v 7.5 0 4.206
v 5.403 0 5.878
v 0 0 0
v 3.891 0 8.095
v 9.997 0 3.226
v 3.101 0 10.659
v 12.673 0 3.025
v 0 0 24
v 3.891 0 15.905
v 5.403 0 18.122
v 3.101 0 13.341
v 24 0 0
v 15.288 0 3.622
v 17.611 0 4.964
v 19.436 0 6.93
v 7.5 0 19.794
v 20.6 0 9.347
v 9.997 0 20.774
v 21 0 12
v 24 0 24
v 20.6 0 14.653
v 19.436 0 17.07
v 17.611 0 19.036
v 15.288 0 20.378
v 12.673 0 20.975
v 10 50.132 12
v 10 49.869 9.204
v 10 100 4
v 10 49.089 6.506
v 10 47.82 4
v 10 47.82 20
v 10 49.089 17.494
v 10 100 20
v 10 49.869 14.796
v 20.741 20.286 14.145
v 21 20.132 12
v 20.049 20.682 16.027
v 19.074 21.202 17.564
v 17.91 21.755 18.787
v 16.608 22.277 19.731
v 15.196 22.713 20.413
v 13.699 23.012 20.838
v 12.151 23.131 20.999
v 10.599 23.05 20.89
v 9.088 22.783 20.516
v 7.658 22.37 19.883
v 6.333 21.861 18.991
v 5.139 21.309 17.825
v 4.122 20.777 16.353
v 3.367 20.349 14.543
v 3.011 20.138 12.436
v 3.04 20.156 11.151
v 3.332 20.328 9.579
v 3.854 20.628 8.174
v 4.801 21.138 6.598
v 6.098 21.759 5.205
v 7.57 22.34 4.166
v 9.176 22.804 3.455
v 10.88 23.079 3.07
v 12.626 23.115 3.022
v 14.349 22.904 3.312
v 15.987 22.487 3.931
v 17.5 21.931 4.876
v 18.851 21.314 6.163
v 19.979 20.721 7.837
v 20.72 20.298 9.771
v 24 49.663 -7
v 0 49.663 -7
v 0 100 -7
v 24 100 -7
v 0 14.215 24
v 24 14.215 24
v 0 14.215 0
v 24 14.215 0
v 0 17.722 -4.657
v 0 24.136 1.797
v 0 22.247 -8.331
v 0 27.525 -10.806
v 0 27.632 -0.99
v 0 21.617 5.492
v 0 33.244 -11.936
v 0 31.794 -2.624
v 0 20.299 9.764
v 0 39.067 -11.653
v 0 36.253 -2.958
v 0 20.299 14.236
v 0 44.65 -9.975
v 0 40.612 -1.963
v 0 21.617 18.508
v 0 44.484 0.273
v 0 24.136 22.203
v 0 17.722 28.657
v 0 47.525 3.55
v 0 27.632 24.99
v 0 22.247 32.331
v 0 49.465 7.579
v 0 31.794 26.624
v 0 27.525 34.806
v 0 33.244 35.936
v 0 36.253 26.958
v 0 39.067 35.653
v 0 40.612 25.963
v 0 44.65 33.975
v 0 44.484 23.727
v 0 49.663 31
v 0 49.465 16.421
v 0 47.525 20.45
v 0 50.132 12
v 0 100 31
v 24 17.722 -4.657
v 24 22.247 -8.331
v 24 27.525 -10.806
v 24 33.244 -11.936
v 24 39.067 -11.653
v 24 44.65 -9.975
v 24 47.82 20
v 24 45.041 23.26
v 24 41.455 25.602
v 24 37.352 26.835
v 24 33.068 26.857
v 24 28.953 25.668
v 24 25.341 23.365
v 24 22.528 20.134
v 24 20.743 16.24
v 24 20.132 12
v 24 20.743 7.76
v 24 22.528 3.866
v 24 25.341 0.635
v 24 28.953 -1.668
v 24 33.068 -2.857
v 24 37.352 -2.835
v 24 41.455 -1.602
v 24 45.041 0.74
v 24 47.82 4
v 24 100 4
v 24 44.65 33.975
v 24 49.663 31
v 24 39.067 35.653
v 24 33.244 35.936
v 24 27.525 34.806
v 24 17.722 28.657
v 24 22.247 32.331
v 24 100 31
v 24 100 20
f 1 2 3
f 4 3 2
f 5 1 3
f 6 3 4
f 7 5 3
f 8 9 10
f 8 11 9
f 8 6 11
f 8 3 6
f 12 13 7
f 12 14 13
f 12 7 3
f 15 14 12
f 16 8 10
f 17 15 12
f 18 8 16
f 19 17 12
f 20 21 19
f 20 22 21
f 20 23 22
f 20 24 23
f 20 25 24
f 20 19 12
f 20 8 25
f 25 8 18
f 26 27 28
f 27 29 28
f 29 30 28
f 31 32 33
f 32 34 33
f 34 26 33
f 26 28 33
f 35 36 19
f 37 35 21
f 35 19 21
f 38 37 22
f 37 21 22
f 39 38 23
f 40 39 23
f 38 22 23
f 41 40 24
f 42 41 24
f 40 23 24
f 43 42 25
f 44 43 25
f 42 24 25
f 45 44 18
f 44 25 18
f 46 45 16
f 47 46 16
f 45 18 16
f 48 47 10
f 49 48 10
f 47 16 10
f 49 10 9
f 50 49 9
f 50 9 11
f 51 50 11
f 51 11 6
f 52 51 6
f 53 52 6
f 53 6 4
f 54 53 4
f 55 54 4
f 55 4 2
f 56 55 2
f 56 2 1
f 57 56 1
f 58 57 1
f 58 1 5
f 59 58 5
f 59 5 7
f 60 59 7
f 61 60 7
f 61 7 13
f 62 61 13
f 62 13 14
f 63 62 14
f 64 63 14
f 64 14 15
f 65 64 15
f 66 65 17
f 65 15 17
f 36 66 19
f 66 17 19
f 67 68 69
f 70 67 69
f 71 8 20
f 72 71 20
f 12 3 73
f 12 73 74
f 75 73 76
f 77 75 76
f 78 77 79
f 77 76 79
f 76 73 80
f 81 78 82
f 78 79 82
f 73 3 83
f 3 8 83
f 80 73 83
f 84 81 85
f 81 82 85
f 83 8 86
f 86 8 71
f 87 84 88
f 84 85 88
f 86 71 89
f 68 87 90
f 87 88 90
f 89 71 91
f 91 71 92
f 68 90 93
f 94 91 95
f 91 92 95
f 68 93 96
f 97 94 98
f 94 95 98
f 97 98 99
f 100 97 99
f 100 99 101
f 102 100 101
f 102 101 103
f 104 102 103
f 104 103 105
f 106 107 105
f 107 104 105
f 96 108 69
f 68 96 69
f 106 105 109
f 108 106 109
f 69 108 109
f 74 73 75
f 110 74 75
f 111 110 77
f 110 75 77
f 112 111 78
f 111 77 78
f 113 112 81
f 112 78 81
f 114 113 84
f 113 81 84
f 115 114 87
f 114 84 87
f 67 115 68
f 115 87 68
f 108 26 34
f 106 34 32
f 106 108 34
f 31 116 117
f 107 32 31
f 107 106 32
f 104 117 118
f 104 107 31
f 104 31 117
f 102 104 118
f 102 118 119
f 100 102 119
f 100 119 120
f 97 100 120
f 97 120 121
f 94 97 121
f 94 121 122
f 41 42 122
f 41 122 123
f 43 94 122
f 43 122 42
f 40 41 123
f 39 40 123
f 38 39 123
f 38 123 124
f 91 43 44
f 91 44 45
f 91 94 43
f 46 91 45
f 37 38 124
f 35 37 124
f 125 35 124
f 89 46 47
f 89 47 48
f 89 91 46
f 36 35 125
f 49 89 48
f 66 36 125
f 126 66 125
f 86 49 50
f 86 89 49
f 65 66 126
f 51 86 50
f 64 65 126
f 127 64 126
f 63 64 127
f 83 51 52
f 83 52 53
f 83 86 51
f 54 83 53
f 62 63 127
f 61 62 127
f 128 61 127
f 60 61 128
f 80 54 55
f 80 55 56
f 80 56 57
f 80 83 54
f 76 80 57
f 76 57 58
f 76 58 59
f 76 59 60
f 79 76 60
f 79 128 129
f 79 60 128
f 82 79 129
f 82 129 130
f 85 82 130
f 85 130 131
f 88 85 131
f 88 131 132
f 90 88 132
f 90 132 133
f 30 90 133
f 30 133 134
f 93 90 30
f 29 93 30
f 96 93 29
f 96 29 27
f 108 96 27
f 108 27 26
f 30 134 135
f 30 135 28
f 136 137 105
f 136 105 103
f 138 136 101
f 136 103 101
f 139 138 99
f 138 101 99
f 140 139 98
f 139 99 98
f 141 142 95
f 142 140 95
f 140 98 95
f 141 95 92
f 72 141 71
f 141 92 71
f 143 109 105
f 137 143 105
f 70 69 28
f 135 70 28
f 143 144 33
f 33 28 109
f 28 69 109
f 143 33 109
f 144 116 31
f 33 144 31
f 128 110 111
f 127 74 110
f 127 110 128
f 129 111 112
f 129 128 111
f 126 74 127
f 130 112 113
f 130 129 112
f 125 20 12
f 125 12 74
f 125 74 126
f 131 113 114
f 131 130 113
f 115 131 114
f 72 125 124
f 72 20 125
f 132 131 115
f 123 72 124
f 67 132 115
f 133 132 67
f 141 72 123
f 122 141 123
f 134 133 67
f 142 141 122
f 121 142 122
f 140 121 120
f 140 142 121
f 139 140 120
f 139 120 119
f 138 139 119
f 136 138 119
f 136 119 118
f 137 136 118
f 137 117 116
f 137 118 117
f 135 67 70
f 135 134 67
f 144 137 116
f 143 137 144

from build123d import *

# Parameters (mm, degrees)
F0_W      = 24
F0_H      = 24
F1_DEPTH  = 20
F3_R      = 24
F3_R_2    = 15
F4_DEPTH  = 24
F6_DEPTH  = 24
F2_R      = 15
F7_DEPTH  = 24
F8_W      = 14
F8_H      = 16
F9_DEPTH  = 65
F10_R     = 9
F11_DEPTH = 35


with BuildPart() as f1:
    # F0 (on Front) → F1 (new body)
    with BuildSketch(Plane.XZ):
        with Locations((12, 12)):
            Rectangle(F0_W, F0_H)
    extrude(amount=-F1_DEPTH)

    # F3 (on face) → F4 (join)
    with BuildSketch(Plane.YZ):
        with Locations((35, 12)):
            Circle(F3_R)
        with Locations((35.131581, 12)):
            Circle(F3_R_2, mode=Mode.SUBTRACT)
    extrude(amount=F4_DEPTH)

    # F5 (on Right) → F6 (join)
    with BuildSketch(Plane.YZ):
        Polygon((35, 31), (35, 0), (35, -7), (100, -7), (100, 31), align=None)
    extrude(amount=F6_DEPTH)

    # F2 (on Right) → F7 (cut)
    with BuildSketch(Plane.YZ):
        with Locations((35.131581, 12)):
            Circle(F2_R)
    extrude(amount=F7_DEPTH, mode=Mode.SUBTRACT)

    # F8 (on face) → F9 (cut)
    with BuildSketch(Plane(origin=(0, 100, 0), x_dir=(-1, 0, 0), z_dir=(0, 1, 0))):
        with Locations((-17, 12)):
            Rectangle(F8_W, F8_H)
    extrude(amount=-F9_DEPTH, mode=Mode.SUBTRACT)

    # F10 (on face) → F11 (cut)
    with BuildSketch(Plane.XZ):
        with Locations((12, 12)):
            Circle(F10_R)
    extrude(amount=-F11_DEPTH, mode=Mode.SUBTRACT)


solid = f1.part
